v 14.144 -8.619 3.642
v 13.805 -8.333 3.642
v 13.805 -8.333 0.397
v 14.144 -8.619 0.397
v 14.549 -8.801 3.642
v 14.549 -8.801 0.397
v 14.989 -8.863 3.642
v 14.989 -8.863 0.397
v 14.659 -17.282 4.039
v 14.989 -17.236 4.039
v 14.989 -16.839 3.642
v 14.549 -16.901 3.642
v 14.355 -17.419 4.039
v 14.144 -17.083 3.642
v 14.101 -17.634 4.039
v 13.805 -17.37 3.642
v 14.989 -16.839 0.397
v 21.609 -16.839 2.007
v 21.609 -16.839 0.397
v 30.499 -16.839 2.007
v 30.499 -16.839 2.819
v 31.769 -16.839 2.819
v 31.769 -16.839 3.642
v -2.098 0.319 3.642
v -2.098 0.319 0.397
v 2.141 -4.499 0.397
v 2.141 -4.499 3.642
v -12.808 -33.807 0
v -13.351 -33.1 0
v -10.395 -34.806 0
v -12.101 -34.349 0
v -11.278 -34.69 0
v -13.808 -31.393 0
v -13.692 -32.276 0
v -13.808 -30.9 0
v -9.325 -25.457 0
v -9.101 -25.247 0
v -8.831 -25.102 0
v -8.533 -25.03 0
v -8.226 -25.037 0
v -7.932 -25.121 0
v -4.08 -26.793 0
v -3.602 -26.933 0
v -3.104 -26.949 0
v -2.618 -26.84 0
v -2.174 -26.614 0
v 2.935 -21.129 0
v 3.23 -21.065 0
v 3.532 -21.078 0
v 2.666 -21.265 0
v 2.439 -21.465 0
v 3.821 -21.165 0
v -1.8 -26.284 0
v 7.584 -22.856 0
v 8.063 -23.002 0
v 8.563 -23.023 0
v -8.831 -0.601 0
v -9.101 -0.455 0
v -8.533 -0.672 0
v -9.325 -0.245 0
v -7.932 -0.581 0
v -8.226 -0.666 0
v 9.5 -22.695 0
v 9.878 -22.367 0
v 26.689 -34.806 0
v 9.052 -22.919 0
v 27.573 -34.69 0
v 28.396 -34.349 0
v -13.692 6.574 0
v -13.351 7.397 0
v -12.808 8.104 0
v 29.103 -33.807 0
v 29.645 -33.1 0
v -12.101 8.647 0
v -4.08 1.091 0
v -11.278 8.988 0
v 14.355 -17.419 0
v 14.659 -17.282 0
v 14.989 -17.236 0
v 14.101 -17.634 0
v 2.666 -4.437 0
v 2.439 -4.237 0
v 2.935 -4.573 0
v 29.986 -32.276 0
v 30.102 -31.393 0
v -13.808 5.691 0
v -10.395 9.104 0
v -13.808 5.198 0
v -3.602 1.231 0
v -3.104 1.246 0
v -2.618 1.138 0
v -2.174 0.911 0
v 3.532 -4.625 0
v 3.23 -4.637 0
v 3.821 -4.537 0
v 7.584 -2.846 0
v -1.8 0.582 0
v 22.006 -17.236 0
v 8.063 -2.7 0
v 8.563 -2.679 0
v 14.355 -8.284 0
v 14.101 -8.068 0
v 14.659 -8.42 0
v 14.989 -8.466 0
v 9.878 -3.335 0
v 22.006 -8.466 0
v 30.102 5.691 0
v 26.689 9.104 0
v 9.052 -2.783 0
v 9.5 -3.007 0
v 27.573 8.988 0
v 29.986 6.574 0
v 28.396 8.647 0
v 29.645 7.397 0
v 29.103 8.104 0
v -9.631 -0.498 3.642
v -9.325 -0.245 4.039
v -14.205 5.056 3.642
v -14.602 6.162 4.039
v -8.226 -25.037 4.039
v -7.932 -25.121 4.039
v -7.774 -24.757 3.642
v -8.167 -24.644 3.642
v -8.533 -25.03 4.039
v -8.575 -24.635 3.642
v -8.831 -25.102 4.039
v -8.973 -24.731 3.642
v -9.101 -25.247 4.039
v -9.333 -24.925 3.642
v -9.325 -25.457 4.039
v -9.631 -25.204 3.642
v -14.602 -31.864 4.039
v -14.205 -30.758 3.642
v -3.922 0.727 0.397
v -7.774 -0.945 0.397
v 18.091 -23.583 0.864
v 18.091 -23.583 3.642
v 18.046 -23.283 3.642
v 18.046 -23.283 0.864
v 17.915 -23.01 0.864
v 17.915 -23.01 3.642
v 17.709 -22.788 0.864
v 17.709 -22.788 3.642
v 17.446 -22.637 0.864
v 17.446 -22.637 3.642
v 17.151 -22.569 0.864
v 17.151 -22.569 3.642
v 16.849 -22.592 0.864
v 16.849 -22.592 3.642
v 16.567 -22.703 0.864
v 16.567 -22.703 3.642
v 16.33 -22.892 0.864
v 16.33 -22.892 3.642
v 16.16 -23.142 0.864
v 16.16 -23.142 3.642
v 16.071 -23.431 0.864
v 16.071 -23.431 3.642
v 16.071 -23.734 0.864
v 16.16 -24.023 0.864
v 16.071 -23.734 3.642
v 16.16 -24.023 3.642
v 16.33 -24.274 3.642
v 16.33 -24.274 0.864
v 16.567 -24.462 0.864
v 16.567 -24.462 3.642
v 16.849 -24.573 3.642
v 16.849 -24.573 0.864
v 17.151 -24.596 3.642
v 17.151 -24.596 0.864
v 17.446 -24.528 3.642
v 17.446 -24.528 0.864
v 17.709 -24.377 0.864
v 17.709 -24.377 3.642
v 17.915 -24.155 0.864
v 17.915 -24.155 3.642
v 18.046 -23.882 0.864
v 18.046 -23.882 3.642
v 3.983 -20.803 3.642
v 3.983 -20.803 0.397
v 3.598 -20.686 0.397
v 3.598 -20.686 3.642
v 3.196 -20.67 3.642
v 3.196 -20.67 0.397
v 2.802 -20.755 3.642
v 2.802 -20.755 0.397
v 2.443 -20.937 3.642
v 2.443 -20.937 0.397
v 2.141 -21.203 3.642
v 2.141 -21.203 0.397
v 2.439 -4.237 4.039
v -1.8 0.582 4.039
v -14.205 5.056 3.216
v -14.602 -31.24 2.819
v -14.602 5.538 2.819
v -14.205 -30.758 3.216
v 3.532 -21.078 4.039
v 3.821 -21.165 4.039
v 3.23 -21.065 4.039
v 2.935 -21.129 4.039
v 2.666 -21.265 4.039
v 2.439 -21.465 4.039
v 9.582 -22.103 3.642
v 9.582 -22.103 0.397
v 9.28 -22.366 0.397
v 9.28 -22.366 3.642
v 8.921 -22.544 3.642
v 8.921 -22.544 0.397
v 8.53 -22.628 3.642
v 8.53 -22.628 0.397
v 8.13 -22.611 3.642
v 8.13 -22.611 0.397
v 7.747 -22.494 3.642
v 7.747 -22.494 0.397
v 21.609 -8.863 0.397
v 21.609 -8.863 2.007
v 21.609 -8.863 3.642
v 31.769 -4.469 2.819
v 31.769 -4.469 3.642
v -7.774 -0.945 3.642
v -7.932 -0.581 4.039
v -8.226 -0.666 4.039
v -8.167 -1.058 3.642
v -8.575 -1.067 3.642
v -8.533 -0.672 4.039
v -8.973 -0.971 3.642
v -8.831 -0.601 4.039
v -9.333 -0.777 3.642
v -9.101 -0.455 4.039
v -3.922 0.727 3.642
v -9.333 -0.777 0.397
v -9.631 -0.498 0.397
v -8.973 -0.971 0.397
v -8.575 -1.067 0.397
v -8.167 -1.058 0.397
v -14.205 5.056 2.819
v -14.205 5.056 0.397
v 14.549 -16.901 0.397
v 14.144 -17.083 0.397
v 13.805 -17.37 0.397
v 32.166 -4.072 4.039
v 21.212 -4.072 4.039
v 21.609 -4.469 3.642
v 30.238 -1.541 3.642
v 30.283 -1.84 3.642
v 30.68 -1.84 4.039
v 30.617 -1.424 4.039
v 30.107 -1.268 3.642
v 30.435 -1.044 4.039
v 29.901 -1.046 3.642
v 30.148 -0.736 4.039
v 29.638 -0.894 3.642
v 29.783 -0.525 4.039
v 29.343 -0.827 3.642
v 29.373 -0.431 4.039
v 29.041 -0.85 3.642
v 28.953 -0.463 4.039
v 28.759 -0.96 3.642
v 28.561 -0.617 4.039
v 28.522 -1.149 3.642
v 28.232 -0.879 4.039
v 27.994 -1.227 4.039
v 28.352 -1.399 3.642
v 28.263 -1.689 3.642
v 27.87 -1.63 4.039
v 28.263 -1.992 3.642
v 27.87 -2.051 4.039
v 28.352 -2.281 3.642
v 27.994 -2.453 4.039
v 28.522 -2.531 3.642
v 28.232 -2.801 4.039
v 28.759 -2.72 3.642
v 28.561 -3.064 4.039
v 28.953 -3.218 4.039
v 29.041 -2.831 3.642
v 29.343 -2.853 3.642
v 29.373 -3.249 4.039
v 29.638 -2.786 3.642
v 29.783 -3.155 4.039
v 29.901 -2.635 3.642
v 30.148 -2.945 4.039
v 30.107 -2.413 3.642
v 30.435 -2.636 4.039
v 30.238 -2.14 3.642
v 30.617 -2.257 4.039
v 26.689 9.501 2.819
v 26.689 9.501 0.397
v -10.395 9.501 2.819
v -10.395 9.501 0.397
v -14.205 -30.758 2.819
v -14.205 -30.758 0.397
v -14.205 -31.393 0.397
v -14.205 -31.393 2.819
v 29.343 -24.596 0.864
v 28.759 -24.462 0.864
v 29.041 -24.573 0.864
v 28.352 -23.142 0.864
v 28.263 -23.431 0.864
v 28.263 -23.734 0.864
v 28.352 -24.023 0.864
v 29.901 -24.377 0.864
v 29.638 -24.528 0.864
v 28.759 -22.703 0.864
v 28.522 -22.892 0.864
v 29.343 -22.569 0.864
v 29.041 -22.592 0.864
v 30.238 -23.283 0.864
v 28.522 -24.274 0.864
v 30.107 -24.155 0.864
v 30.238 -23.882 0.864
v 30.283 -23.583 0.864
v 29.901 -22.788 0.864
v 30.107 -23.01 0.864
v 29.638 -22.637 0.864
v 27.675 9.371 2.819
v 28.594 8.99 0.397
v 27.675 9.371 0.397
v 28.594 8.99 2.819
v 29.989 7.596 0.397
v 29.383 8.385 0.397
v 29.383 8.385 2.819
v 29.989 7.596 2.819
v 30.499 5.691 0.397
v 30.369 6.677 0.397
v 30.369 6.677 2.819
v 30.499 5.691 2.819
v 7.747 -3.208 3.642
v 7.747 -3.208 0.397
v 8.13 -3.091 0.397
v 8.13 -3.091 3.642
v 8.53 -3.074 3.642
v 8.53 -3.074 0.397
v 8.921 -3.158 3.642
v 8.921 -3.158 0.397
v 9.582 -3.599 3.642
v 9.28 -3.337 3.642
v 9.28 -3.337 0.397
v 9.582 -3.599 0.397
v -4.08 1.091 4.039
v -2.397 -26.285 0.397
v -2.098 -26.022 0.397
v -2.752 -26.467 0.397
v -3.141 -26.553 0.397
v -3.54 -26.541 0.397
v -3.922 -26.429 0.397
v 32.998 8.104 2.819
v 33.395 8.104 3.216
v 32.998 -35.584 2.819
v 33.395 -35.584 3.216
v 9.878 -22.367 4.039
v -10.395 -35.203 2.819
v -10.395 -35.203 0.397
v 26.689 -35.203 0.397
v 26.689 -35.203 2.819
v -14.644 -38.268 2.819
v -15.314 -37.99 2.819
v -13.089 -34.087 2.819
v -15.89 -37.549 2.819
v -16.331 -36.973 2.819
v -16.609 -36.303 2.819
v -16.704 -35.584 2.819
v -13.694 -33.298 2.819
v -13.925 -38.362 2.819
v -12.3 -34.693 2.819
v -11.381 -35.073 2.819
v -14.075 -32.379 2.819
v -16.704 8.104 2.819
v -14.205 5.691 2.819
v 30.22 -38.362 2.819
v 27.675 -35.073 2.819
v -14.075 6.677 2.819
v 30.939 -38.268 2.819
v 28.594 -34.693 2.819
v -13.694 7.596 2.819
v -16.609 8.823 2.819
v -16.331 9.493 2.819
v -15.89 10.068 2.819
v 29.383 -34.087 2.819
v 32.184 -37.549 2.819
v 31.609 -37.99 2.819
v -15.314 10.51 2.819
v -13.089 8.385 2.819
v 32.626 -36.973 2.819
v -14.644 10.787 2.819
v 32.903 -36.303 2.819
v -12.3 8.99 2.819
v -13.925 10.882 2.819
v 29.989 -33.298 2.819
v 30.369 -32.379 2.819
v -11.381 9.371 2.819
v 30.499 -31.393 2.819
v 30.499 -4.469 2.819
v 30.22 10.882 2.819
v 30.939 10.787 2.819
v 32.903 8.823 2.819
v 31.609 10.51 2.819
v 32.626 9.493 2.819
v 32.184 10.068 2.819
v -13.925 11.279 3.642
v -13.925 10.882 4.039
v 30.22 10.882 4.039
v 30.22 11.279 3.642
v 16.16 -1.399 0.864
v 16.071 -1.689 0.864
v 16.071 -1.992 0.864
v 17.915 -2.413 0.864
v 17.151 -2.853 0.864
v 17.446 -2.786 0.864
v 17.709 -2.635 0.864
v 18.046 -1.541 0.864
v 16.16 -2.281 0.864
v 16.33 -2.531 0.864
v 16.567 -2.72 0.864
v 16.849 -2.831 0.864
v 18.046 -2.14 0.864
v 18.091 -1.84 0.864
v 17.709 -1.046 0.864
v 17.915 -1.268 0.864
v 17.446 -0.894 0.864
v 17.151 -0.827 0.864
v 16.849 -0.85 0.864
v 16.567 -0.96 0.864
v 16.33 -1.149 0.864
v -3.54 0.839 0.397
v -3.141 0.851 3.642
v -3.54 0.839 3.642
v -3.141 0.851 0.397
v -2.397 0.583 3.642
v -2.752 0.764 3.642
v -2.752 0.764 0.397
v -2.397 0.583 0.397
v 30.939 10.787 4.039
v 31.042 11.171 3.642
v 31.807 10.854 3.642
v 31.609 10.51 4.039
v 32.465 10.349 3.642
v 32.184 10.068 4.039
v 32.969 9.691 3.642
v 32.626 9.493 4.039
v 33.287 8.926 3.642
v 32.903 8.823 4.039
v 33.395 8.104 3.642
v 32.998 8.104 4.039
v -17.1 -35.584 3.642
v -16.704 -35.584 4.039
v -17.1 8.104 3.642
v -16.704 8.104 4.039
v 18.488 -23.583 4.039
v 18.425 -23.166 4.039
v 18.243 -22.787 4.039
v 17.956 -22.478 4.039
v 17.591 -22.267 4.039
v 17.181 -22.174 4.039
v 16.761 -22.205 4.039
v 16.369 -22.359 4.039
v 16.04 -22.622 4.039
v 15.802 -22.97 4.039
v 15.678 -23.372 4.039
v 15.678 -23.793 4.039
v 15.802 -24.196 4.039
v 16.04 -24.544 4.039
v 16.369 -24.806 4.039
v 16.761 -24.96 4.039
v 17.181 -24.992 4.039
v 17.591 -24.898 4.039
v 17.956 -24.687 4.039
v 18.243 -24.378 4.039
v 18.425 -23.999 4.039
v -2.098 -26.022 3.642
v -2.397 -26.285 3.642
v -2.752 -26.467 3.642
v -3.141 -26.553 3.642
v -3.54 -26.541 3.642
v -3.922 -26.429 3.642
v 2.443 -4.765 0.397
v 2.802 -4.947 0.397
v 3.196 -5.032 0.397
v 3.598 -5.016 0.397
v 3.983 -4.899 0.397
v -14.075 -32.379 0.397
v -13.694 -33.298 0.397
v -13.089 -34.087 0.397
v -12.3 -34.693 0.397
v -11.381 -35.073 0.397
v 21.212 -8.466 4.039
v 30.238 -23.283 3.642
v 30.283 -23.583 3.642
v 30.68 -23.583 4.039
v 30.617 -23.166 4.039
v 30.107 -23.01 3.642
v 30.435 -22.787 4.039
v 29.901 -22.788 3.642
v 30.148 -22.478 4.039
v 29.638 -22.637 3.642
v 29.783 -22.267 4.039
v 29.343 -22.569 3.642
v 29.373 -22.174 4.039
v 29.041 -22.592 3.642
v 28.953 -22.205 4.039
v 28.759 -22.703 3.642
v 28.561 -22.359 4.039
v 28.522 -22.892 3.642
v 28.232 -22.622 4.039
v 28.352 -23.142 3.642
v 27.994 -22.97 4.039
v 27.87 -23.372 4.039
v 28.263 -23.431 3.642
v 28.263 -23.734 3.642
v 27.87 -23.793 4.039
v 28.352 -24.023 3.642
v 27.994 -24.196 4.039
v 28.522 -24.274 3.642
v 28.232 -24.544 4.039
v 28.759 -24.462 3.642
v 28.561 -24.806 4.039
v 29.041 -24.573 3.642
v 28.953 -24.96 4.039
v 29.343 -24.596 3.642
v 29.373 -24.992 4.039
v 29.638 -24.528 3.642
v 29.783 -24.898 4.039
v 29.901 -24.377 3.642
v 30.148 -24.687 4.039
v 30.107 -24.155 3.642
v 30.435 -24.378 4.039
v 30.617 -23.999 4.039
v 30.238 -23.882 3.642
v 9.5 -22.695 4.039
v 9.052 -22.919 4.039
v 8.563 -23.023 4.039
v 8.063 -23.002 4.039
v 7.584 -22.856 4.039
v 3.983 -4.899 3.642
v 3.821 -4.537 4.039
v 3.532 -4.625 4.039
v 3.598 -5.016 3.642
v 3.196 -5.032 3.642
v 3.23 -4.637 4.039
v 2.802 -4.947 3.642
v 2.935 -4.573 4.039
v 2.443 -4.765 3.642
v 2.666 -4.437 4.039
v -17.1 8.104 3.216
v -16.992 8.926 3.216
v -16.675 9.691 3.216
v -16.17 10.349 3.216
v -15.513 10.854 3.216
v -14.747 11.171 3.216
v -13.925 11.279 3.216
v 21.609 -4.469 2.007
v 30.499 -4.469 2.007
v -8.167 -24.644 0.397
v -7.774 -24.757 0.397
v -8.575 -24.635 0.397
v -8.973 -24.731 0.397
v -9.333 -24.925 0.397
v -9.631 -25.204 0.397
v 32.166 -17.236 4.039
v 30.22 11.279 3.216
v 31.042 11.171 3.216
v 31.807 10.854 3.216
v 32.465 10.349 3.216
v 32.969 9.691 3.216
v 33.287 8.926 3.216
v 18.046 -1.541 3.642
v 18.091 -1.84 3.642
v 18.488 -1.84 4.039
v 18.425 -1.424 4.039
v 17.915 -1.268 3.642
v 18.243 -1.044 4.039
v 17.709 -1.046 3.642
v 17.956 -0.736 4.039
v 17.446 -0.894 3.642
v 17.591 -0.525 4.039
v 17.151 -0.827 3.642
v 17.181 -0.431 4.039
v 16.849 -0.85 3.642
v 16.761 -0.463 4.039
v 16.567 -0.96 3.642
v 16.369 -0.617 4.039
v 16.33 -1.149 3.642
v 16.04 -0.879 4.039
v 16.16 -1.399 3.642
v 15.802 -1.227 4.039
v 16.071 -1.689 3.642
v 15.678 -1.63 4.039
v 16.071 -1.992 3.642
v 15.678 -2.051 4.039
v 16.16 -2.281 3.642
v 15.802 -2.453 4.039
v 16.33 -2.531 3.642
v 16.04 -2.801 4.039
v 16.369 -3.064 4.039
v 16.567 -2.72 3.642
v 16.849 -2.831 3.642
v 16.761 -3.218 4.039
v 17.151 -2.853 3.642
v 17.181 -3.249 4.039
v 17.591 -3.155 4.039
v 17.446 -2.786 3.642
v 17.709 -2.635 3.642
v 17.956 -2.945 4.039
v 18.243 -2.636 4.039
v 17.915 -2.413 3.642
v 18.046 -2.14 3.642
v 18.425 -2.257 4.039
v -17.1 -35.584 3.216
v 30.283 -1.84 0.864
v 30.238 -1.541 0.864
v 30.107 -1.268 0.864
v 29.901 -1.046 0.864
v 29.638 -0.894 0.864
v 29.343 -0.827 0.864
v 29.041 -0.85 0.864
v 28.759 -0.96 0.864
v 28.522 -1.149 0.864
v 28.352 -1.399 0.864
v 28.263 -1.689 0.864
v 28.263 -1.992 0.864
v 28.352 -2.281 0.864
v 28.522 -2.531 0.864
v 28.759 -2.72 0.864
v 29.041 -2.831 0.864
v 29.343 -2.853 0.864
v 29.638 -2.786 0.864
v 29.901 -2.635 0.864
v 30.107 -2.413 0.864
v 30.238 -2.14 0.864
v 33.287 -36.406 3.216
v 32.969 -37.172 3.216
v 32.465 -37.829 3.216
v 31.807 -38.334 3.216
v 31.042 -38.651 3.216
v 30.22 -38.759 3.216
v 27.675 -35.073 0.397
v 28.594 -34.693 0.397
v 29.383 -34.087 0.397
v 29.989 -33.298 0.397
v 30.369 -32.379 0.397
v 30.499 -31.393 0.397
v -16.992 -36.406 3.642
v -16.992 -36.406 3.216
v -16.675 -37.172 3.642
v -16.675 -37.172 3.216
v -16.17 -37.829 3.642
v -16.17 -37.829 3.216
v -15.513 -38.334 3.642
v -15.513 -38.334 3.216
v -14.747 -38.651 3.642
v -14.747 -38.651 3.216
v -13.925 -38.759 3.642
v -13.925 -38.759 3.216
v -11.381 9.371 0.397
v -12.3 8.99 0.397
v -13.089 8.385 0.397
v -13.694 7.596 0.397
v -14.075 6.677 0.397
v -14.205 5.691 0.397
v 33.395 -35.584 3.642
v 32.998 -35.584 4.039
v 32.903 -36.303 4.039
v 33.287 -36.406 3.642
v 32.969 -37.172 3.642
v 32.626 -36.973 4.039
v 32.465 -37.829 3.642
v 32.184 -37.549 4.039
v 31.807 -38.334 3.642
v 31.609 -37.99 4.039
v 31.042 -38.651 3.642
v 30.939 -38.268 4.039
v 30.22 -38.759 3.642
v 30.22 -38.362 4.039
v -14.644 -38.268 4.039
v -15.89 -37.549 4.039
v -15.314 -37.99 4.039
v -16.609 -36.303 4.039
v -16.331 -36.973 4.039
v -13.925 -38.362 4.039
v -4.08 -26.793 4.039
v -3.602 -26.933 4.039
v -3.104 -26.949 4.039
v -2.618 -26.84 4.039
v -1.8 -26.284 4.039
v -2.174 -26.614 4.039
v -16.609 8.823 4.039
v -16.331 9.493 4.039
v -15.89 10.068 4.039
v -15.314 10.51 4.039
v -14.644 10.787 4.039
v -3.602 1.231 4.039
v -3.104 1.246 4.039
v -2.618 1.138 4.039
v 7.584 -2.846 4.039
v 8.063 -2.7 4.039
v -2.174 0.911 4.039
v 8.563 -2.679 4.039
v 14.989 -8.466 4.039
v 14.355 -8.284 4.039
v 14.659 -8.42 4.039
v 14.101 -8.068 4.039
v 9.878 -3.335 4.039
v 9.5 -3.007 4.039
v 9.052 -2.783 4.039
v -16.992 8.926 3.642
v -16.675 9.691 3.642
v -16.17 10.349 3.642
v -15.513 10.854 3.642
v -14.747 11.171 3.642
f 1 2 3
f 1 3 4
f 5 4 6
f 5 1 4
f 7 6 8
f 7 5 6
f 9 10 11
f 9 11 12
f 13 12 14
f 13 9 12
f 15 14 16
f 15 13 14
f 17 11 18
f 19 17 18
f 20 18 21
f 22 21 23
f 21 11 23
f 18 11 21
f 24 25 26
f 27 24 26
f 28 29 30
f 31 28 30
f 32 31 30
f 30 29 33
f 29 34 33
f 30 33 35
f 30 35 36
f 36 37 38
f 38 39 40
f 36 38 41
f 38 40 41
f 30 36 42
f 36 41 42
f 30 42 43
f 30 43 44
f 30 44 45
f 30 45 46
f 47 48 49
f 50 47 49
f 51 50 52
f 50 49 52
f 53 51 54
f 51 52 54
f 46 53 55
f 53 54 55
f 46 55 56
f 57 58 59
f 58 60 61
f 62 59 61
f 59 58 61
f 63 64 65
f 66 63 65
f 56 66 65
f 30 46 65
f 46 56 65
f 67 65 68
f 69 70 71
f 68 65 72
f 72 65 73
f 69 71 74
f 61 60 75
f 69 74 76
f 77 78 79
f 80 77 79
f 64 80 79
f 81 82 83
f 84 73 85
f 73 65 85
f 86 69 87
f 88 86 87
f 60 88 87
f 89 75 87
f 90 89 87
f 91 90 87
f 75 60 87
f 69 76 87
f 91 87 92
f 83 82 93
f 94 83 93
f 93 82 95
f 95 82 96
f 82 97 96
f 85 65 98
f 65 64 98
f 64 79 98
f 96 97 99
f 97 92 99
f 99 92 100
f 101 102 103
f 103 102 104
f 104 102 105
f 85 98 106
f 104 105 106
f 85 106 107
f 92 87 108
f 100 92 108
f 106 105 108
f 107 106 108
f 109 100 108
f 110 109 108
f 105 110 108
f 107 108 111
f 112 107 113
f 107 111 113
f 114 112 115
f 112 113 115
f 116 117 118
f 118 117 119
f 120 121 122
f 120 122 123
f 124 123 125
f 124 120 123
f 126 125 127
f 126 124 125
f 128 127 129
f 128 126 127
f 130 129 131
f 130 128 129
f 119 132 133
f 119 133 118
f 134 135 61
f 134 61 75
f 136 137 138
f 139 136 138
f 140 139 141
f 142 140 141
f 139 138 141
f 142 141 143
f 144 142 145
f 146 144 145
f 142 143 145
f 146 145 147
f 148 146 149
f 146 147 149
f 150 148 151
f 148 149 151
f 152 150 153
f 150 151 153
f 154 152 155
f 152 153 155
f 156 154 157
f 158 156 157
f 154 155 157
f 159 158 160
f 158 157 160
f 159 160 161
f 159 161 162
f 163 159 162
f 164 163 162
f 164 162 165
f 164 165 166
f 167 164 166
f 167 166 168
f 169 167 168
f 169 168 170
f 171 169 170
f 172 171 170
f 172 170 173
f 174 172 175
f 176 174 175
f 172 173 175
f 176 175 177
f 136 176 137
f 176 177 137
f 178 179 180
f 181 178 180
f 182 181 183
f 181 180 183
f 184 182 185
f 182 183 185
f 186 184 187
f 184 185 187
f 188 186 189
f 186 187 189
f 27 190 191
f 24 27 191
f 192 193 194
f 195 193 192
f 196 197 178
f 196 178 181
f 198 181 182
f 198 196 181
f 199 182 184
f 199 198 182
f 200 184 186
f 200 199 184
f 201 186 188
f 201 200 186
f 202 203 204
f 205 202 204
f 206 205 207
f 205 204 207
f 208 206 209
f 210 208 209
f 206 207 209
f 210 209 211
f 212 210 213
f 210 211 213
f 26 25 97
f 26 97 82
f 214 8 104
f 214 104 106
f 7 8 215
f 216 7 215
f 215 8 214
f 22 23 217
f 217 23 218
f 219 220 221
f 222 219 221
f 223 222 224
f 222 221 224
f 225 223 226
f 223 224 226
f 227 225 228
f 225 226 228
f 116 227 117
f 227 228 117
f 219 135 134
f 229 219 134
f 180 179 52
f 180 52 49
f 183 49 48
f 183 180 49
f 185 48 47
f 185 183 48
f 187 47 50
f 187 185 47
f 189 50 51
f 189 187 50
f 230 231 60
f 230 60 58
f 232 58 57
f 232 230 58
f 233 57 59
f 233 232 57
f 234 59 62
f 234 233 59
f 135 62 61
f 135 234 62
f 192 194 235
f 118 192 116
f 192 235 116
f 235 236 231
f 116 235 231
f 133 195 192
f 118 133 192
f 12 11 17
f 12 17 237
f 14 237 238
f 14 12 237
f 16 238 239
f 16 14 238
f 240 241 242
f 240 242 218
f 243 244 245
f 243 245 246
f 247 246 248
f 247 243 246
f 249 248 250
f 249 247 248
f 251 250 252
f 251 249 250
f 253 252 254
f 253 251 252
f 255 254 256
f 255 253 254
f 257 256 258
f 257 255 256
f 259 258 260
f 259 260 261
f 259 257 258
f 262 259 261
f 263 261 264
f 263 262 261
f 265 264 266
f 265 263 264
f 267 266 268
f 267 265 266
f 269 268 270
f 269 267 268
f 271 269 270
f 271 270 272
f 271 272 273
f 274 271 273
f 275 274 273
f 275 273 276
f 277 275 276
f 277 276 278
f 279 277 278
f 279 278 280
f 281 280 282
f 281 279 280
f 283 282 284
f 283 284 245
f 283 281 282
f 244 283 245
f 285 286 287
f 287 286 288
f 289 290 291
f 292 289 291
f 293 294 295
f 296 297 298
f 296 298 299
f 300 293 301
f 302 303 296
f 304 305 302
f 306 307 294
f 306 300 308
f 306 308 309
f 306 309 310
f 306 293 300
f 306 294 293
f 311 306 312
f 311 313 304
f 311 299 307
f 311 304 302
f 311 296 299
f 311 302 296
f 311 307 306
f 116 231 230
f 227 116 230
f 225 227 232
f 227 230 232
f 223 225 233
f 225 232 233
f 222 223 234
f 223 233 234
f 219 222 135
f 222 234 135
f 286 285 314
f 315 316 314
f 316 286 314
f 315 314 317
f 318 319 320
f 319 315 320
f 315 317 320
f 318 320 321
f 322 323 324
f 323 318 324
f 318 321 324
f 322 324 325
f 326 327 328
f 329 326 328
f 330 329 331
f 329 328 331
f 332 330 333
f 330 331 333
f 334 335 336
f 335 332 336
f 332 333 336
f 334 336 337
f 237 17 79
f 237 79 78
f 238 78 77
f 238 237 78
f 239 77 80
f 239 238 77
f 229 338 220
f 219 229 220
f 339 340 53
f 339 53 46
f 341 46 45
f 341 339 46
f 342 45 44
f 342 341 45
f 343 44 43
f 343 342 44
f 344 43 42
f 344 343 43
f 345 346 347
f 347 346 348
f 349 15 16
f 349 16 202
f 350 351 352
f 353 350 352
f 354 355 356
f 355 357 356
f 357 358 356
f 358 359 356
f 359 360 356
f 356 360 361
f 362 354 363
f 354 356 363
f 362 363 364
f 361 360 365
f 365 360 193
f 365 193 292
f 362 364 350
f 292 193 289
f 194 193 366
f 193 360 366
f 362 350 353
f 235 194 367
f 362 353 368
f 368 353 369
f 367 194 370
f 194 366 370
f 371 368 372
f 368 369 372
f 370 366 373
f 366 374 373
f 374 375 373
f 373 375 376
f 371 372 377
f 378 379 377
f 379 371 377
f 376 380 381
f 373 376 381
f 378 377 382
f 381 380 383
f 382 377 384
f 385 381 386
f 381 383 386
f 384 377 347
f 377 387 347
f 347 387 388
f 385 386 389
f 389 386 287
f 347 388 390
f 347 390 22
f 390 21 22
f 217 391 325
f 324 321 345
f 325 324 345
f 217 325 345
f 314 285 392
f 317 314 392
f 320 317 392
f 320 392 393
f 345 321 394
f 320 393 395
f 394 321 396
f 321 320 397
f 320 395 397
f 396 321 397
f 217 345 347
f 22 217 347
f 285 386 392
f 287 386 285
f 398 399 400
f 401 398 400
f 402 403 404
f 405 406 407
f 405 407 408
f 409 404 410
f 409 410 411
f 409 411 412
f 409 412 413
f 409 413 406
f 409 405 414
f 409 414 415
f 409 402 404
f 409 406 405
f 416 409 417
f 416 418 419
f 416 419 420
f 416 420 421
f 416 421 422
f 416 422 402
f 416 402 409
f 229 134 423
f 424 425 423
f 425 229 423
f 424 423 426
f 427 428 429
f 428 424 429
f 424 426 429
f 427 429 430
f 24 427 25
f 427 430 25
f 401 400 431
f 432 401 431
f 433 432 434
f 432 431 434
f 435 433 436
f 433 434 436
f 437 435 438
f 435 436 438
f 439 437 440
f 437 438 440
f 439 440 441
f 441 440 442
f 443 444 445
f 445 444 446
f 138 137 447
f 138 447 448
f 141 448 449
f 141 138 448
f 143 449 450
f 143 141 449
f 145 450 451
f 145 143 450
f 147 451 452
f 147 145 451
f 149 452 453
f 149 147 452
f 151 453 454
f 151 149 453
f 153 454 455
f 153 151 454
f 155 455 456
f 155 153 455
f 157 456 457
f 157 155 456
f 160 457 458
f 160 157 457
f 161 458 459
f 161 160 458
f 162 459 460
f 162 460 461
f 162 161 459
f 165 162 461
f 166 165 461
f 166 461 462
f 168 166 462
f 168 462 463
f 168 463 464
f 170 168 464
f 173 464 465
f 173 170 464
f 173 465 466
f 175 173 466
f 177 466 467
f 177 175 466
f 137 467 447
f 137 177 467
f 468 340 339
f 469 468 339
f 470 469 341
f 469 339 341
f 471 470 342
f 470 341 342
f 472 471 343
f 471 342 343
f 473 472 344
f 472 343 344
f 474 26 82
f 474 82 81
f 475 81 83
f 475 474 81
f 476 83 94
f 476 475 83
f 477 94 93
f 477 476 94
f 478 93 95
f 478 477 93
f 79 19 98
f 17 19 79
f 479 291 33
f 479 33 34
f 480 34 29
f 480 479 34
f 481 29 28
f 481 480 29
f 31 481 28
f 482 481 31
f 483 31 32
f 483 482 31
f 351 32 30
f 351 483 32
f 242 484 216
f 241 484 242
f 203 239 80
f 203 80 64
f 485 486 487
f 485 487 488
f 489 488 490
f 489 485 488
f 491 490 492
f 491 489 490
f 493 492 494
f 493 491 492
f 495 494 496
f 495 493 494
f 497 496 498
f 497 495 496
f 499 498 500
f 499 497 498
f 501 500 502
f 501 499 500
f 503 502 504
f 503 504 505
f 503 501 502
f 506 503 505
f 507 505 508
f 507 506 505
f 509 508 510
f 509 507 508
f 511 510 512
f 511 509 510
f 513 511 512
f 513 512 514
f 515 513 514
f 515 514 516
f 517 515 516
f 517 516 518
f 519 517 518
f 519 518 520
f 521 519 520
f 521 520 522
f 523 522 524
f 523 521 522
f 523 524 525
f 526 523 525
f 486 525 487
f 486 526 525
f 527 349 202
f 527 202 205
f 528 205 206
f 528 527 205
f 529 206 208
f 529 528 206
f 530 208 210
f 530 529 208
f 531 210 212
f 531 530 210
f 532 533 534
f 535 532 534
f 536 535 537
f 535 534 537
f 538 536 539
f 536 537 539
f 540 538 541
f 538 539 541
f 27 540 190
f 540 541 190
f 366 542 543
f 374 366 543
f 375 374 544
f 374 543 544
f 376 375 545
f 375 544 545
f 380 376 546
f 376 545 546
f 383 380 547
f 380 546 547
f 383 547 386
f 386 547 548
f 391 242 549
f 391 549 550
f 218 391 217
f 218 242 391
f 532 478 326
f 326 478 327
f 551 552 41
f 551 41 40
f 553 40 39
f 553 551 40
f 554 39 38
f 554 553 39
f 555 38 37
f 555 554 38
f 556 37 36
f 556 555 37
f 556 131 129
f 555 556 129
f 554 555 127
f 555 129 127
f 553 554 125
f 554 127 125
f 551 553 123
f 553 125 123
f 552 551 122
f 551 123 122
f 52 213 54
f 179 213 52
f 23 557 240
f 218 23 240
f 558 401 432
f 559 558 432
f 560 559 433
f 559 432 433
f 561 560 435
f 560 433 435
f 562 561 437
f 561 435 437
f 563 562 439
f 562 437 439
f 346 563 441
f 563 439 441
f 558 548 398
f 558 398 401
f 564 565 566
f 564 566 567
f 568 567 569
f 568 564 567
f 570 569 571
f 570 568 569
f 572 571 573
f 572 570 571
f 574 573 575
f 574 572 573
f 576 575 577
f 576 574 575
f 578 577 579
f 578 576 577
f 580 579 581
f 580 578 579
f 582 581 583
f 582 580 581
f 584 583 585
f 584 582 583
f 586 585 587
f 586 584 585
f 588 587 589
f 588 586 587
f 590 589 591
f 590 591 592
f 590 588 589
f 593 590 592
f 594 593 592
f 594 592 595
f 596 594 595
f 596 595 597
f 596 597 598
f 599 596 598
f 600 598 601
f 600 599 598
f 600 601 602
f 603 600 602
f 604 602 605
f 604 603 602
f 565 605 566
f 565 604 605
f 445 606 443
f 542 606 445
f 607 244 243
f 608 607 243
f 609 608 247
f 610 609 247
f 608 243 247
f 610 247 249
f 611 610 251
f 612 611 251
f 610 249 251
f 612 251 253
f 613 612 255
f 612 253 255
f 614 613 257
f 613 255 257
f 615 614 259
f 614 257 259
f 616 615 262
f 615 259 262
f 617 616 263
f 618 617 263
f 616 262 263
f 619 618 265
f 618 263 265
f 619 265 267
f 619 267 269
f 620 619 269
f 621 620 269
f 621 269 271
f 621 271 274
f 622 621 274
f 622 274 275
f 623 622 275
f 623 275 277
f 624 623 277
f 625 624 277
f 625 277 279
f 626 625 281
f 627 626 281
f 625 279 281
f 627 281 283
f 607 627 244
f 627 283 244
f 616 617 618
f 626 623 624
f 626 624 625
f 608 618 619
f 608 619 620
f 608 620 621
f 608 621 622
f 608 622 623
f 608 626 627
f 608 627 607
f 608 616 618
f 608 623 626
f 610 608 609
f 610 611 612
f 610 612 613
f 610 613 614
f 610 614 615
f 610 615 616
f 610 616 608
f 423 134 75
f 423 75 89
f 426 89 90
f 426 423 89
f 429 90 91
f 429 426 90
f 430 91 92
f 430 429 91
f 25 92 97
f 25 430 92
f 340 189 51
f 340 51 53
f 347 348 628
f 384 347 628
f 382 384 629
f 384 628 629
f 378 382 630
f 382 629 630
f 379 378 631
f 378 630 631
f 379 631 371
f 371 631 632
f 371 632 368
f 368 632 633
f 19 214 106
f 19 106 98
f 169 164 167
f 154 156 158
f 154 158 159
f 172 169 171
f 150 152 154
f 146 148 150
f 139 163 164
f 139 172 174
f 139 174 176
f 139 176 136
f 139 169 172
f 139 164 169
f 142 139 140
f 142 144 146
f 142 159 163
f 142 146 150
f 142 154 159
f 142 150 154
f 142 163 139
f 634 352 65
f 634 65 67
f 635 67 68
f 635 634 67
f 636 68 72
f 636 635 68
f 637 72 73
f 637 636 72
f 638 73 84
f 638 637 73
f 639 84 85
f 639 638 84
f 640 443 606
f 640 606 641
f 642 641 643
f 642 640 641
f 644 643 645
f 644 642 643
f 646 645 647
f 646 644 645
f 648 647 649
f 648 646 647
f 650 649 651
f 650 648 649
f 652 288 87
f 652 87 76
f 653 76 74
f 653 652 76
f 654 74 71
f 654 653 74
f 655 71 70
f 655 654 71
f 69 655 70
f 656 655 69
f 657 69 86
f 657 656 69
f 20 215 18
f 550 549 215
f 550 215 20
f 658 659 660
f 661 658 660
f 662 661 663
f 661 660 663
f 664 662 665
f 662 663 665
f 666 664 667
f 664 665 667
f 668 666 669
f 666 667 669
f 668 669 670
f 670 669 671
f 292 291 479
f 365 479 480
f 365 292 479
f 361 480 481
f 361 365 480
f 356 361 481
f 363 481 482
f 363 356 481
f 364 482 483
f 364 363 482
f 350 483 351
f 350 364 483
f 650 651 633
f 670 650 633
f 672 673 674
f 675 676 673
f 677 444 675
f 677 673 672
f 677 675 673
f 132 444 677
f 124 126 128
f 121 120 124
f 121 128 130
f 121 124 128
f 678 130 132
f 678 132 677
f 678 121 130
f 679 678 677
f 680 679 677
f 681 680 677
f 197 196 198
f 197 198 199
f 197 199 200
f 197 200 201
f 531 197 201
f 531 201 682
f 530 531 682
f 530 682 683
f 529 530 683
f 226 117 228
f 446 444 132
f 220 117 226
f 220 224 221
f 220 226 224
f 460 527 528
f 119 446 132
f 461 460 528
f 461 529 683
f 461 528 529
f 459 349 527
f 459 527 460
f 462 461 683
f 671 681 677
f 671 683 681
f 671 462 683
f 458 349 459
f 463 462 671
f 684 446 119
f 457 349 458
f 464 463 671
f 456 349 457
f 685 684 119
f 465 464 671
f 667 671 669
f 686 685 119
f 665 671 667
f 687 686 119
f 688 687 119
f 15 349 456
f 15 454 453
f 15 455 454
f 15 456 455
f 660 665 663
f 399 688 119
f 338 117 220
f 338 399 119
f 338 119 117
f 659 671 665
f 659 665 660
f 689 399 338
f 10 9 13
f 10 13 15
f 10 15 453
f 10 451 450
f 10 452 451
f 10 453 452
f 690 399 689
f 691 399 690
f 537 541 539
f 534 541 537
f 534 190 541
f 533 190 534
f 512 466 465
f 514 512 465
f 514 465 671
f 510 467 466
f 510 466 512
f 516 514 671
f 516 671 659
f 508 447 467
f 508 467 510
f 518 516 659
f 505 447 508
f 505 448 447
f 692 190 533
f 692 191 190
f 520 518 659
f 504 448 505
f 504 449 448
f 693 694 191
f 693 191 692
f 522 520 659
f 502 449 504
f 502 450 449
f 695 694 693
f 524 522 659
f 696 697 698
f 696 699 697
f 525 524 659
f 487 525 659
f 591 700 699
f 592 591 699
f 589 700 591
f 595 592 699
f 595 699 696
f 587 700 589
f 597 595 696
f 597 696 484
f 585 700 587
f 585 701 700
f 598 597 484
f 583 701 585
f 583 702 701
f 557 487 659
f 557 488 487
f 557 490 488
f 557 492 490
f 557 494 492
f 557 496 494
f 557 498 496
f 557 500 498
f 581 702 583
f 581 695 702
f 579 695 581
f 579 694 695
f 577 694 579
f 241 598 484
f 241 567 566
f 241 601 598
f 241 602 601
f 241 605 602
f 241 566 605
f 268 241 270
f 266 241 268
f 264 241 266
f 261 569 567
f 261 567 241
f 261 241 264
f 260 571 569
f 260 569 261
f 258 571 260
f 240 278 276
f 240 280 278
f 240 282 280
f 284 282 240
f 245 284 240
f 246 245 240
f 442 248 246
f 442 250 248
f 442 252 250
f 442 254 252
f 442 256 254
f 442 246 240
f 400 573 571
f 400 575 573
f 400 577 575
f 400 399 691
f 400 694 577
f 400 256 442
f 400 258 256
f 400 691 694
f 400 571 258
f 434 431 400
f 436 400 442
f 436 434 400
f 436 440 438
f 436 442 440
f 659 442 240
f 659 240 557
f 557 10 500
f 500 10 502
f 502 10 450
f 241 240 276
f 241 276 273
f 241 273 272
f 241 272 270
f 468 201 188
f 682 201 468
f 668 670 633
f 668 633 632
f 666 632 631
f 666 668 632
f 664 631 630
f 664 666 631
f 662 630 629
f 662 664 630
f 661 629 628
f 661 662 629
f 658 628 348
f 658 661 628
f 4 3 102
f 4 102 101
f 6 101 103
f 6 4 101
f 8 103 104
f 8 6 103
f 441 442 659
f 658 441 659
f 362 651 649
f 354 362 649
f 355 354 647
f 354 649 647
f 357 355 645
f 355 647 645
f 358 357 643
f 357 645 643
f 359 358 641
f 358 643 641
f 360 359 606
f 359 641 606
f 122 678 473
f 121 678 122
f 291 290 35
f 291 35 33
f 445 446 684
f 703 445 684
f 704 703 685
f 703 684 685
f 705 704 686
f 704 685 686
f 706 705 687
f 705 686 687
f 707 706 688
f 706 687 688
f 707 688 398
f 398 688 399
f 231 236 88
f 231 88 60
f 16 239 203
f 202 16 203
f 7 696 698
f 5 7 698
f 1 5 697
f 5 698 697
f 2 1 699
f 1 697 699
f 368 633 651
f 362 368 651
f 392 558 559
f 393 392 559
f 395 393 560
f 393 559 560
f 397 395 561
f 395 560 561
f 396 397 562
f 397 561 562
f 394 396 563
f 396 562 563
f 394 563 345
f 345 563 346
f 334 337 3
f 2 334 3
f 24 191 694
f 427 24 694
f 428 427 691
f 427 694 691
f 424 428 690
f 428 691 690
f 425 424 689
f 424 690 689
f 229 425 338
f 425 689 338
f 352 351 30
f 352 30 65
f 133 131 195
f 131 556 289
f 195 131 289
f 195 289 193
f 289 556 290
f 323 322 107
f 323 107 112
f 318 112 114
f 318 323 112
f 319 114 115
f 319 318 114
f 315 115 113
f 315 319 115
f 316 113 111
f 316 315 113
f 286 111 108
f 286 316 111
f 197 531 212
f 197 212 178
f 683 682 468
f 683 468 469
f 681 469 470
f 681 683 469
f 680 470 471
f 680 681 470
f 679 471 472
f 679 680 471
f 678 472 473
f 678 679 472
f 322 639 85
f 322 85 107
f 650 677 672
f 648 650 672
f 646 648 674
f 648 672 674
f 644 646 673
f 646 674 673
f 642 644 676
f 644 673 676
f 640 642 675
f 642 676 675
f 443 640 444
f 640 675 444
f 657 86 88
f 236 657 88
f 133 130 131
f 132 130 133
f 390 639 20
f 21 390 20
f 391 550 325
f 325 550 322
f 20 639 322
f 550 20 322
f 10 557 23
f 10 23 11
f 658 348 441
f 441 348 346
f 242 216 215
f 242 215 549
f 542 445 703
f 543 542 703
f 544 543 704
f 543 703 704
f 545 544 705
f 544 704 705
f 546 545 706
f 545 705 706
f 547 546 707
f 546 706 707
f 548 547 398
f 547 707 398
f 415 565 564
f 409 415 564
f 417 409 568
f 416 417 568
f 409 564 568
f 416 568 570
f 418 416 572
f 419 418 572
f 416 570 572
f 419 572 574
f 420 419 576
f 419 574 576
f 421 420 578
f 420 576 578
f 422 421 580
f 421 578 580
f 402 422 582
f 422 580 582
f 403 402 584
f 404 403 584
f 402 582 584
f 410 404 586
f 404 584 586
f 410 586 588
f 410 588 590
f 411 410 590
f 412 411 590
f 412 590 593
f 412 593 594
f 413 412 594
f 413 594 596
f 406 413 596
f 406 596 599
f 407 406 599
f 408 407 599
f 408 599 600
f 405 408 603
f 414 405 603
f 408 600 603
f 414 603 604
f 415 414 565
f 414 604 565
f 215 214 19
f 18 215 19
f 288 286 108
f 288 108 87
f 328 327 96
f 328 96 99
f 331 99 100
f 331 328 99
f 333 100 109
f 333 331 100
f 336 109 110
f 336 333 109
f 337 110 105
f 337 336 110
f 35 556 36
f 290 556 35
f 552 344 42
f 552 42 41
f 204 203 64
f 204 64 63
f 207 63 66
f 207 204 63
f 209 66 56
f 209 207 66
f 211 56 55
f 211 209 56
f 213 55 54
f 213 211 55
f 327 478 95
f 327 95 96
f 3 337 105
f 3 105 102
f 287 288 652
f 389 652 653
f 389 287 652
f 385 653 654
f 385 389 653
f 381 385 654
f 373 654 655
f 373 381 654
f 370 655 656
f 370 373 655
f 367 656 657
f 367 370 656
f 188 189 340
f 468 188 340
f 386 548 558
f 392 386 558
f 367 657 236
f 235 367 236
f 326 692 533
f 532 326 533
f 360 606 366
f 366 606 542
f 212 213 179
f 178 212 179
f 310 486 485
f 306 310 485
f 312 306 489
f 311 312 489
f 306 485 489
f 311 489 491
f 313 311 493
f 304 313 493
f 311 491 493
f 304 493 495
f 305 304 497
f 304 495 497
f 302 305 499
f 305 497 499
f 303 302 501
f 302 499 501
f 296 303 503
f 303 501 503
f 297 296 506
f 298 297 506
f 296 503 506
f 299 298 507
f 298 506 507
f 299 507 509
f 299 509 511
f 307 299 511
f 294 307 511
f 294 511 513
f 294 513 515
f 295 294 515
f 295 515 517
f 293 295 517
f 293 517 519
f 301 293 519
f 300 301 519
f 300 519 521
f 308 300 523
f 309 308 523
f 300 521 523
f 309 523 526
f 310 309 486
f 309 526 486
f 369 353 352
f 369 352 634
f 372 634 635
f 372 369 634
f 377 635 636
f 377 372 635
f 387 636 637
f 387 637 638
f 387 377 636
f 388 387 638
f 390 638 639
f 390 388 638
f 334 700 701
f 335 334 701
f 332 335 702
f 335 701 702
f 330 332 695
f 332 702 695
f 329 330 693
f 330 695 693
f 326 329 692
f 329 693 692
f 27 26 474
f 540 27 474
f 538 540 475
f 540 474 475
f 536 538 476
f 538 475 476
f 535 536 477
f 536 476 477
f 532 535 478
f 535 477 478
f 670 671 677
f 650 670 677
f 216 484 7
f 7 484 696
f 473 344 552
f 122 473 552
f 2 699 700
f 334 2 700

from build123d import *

# Parameters (mm, degrees)
F15_DEPTH = 2.8194
F1_W      = 50.4952
F1_H      = 50.038
F2_DEPTH  = 1.2192
F3_R      = 1.016
F4_DEPTH  = 3.175
F5_W      = 25.5439807123
F5_H      = 7.9756
F6_DEPTH  = 4.0396
F7_W      = 10.16
F7_H      = 12.3698
F8_DEPTH  = 2.032
F9_R      = 3.81
F10_R     = 3.175
F11_R     = 1.5875
F12_SIZE  = 0.396875
F13_SIZE  = 0.396875


# Not quite as in the source:
# - a feature of the source that left no trace in its solid (it failed there, or was rolled back) is left out


with BuildPart() as f15:
    # F0 (on Top) → F15 (new body)
    with BuildSketch(Plane.XY):
        Polygon((30.4991698359, 9.5009198412), (-14.2048301641, 9.5009198412), (-14.2048301641, 5.0559198412), (-8.8708301641, -1.4210801588), (-2.8619992453, 1.1873513896), (2.9147698359, -5.378930905), (8.8075698359, -2.7315337496), (14.7003698359, -9.3367816513), (21.6091698359, -9.3367816513), (21.6091698359, -16.3653786662), (14.7003698359, -16.3653786662), (8.8075698359, -22.970626568), (2.9147698359, -20.3232294125), (-2.8619992453, -26.8895117072), (-8.8708301641, -24.2810801588), (-14.2048301641, -30.7580801588), (-14.2048301641, -35.2030801588), (30.4991698359, -35.2030801588), align=None)
    extrude(amount=F15_DEPTH)

    # F1 (on face) → F2 (join)
    with BuildSketch(Plane.XY.offset(2.8194)):
        with Locations((8.1471698359, -13.7400801588)):
            Rectangle(F1_W, F1_H)
        Polygon((-8.8708301641, -24.2810801588), (-14.2048301641, -30.7580801588), (-14.2048301641, 5.0559198412), (-8.8708301641, -1.4210801588), (-2.8619992453, 1.1873513896), (2.9147698359, -5.378930905), (8.8075698359, -2.7315337496), (14.7003698359, -9.3367816513), (21.6091698359, -9.3367816513), (21.6091698359, -16.3653786662), (14.7003698359, -16.3653786662), (8.8075698359, -22.970626568), (2.9147698359, -20.3232294125), (-2.8619992453, -26.8895117072), align=None, mode=Mode.SUBTRACT)
    extrude(amount=F2_DEPTH)

    # F3 (on face) → F4 (cut)
    with BuildSketch(Plane.XY.offset(4.0386)):
        with Locations((29.2672698359, -1.8401801588)):
            Circle(F3_R)
        with Locations((29.2672698359, -23.5825801588)):
            Circle(F3_R)
        with Locations((17.0752698359, -1.8401801588)):
            Circle(F3_R)
        with Locations((17.0752698359, -23.5825801588)):
            Circle(F3_R)
    extrude(amount=-F4_DEPTH, mode=Mode.SUBTRACT)

    # F5 (on face) → F6 (cut, through all)
    with BuildSketch(Plane(origin=(0, 0, 0), x_dir=(1, 0, 0), z_dir=(0, 0, -1))):
        with Locations((8.8371794797, 12.8510801588)):
            Rectangle(F5_W, F5_H)
    extrude(amount=-F6_DEPTH, mode=Mode.SUBTRACT)

    # F7 (on face) → F8 (cut)
    with BuildSketch(Plane.XY.offset(4.0386)):
        with Locations((26.6891698359, -10.6539801588)):
            Rectangle(F7_W, F7_H)
    extrude(amount=-F8_DEPTH, mode=Mode.SUBTRACT)

    # F9
    f9_edges = [f15.edges().sort_by_distance(p)[0] for p in [
        (-14.20483, -35.20308, 1.4097),
        (30.49917, -35.20308, 1.4097),
        (30.49917, 9.50092, 1.4097),
        (-14.20483, 9.50092, 1.4097),
    ]]
    fillet(f9_edges, radius=F9_R)

    # F10
    f10_edges = [f15.edges().sort_by_distance(p)[0] for p in [
        (33.39477, -38.75908, 3.429),
        (33.39477, 11.27892, 3.429),
        (-17.10043, 11.27892, 3.429),
        (-17.10043, -38.75908, 3.429),
    ]]
    fillet(f10_edges, radius=F10_R)

    # F11
    f11_edges = [f15.edges().sort_by_distance(p)[0] for p in [
        (-8.87083, -24.28108, 2.0193),
        (2.91477, -20.323229, 2.0193),
        (14.277941, -16.83888, 2.0193),
        (14.277941, -8.86328, 2.0193),
        (8.80757, -2.731534, 2.0193),
        (-2.861999, 1.187351, 2.0193),
        (-8.87083, -1.42108, 2.0193),
        (2.91477, -5.378931, 2.0193),
        (-2.861999, -26.889512, 2.0193),
        (8.80757, -22.970627, 2.0193),
    ]]
    fillet(f11_edges, radius=F11_R)

    # F12
    f12_edges = [f15.edges().sort_by_distance(p)[0] for p in [
        (-11.918021, -27.98124, 0),
        (-8.777201, -24.670149, 0),
        (-14.20483, -31.07558, 0),
        (-5.848035, -25.593275, 0),
        (-13.088907, -34.087157, 0),
        (-2.944073, -26.522248, 0),
        (8.14717, -35.20308, 0),
        (0.021273, -23.612182, 0),
        (29.383247, -34.087157, 0),
        (2.996452, -20.69995, 0),
        (30.49917, -12.85108, 0),
        (5.865037, -21.648665, 0),
        (29.383247, 8.384997, 0),
        (8.728242, -22.598537, 0),
        (8.14717, 9.50092, 0),
        (11.693168, -19.736155, 0),
        (-13.088907, 8.384997, 0),
        (14.340089, -16.97761, 0),
        (-14.20483, 5.37342, 0),
        (18.299137, -16.83888, 0),
        (-11.918021, 2.27908, 0),
        (21.60917, -12.85108, 0),
        (-8.777201, -1.032011, 0),
        (18.299137, -8.86328, 0),
        (-5.848035, -0.108886, 0),
        (14.340089, -8.72455, 0),
        (-2.944073, 0.820088, 0),
        (11.693168, -5.966005, 0),
        (0.021273, -2.089978, 0),
        (8.728242, -3.103623, 0),
        (2.996452, -5.00221, 0),
        (5.865037, -4.053495, 0),
    ]]
    chamfer(f12_edges, length=F12_SIZE)

    # F13
    f13_edges = [f15.edges().sort_by_distance(p)[0] for p in [
        (-14.20483, -12.85108, 2.8194),
        (-17.10043, -13.74008, 2.8194),
        (8.14717, -38.75908, 2.8194),
        (33.39477, -13.74008, 2.8194),
        (8.14717, 11.27892, 2.8194),
        (23.379137, -16.83888, 4.0386),
        (14.340089, -16.97761, 4.0386),
        (31.76917, -10.65398, 4.0386),
        (11.693168, -19.736155, 4.0386),
        (26.68917, -4.46908, 4.0386),
        (8.728242, -22.598537, 4.0386),
        (21.60917, -6.66618, 4.0386),
        (5.865037, -21.648665, 4.0386),
        (18.299137, -8.86328, 4.0386),
        (2.996452, -20.69995, 4.0386),
        (14.340089, -8.72455, 4.0386),
        (0.021273, -23.612182, 4.0386),
        (11.693168, -5.966005, 4.0386),
        (-2.944073, -26.522248, 4.0386),
        (8.728242, -3.103623, 4.0386),
        (-5.848035, -25.593275, 4.0386),
        (5.865037, -4.053495, 4.0386),
        (-8.777201, -24.670149, 4.0386),
        (2.996452, -5.00221, 4.0386),
        (-11.918021, -27.98124, 4.0386),
        (0.021273, -2.089978, 4.0386),
        (-14.20483, -12.85108, 4.0386),
        (-2.944073, 0.820088, 4.0386),
        (-11.918021, 2.27908, 4.0386),
        (-5.848035, -0.108886, 4.0386),
        (-8.777201, -1.032011, 4.0386),
        (-17.10043, -13.74008, 4.0386),
        (-16.170494, 10.348984, 4.0386),
        (-16.170494, -37.829144, 4.0386),
        (8.14717, 11.27892, 4.0386),
        (8.14717, -38.75908, 4.0386),
        (32.464834, 10.348984, 4.0386),
        (32.464834, -37.829144, 4.0386),
        (33.39477, -13.74008, 4.0386),
        (16.05927, -23.58258, 4.0386),
        (28.25127, -23.58258, 4.0386),
        (16.05927, -1.84018, 4.0386),
        (28.25127, -1.84018, 4.0386),
        (-16.170494, 10.348984, 2.8194),
        (-16.170494, -37.829144, 2.8194),
        (32.464834, 10.348984, 2.8194),
        (32.464834, -37.829144, 2.8194),
    ]]
    chamfer(f13_edges, length=F13_SIZE)


solid = f15.part
